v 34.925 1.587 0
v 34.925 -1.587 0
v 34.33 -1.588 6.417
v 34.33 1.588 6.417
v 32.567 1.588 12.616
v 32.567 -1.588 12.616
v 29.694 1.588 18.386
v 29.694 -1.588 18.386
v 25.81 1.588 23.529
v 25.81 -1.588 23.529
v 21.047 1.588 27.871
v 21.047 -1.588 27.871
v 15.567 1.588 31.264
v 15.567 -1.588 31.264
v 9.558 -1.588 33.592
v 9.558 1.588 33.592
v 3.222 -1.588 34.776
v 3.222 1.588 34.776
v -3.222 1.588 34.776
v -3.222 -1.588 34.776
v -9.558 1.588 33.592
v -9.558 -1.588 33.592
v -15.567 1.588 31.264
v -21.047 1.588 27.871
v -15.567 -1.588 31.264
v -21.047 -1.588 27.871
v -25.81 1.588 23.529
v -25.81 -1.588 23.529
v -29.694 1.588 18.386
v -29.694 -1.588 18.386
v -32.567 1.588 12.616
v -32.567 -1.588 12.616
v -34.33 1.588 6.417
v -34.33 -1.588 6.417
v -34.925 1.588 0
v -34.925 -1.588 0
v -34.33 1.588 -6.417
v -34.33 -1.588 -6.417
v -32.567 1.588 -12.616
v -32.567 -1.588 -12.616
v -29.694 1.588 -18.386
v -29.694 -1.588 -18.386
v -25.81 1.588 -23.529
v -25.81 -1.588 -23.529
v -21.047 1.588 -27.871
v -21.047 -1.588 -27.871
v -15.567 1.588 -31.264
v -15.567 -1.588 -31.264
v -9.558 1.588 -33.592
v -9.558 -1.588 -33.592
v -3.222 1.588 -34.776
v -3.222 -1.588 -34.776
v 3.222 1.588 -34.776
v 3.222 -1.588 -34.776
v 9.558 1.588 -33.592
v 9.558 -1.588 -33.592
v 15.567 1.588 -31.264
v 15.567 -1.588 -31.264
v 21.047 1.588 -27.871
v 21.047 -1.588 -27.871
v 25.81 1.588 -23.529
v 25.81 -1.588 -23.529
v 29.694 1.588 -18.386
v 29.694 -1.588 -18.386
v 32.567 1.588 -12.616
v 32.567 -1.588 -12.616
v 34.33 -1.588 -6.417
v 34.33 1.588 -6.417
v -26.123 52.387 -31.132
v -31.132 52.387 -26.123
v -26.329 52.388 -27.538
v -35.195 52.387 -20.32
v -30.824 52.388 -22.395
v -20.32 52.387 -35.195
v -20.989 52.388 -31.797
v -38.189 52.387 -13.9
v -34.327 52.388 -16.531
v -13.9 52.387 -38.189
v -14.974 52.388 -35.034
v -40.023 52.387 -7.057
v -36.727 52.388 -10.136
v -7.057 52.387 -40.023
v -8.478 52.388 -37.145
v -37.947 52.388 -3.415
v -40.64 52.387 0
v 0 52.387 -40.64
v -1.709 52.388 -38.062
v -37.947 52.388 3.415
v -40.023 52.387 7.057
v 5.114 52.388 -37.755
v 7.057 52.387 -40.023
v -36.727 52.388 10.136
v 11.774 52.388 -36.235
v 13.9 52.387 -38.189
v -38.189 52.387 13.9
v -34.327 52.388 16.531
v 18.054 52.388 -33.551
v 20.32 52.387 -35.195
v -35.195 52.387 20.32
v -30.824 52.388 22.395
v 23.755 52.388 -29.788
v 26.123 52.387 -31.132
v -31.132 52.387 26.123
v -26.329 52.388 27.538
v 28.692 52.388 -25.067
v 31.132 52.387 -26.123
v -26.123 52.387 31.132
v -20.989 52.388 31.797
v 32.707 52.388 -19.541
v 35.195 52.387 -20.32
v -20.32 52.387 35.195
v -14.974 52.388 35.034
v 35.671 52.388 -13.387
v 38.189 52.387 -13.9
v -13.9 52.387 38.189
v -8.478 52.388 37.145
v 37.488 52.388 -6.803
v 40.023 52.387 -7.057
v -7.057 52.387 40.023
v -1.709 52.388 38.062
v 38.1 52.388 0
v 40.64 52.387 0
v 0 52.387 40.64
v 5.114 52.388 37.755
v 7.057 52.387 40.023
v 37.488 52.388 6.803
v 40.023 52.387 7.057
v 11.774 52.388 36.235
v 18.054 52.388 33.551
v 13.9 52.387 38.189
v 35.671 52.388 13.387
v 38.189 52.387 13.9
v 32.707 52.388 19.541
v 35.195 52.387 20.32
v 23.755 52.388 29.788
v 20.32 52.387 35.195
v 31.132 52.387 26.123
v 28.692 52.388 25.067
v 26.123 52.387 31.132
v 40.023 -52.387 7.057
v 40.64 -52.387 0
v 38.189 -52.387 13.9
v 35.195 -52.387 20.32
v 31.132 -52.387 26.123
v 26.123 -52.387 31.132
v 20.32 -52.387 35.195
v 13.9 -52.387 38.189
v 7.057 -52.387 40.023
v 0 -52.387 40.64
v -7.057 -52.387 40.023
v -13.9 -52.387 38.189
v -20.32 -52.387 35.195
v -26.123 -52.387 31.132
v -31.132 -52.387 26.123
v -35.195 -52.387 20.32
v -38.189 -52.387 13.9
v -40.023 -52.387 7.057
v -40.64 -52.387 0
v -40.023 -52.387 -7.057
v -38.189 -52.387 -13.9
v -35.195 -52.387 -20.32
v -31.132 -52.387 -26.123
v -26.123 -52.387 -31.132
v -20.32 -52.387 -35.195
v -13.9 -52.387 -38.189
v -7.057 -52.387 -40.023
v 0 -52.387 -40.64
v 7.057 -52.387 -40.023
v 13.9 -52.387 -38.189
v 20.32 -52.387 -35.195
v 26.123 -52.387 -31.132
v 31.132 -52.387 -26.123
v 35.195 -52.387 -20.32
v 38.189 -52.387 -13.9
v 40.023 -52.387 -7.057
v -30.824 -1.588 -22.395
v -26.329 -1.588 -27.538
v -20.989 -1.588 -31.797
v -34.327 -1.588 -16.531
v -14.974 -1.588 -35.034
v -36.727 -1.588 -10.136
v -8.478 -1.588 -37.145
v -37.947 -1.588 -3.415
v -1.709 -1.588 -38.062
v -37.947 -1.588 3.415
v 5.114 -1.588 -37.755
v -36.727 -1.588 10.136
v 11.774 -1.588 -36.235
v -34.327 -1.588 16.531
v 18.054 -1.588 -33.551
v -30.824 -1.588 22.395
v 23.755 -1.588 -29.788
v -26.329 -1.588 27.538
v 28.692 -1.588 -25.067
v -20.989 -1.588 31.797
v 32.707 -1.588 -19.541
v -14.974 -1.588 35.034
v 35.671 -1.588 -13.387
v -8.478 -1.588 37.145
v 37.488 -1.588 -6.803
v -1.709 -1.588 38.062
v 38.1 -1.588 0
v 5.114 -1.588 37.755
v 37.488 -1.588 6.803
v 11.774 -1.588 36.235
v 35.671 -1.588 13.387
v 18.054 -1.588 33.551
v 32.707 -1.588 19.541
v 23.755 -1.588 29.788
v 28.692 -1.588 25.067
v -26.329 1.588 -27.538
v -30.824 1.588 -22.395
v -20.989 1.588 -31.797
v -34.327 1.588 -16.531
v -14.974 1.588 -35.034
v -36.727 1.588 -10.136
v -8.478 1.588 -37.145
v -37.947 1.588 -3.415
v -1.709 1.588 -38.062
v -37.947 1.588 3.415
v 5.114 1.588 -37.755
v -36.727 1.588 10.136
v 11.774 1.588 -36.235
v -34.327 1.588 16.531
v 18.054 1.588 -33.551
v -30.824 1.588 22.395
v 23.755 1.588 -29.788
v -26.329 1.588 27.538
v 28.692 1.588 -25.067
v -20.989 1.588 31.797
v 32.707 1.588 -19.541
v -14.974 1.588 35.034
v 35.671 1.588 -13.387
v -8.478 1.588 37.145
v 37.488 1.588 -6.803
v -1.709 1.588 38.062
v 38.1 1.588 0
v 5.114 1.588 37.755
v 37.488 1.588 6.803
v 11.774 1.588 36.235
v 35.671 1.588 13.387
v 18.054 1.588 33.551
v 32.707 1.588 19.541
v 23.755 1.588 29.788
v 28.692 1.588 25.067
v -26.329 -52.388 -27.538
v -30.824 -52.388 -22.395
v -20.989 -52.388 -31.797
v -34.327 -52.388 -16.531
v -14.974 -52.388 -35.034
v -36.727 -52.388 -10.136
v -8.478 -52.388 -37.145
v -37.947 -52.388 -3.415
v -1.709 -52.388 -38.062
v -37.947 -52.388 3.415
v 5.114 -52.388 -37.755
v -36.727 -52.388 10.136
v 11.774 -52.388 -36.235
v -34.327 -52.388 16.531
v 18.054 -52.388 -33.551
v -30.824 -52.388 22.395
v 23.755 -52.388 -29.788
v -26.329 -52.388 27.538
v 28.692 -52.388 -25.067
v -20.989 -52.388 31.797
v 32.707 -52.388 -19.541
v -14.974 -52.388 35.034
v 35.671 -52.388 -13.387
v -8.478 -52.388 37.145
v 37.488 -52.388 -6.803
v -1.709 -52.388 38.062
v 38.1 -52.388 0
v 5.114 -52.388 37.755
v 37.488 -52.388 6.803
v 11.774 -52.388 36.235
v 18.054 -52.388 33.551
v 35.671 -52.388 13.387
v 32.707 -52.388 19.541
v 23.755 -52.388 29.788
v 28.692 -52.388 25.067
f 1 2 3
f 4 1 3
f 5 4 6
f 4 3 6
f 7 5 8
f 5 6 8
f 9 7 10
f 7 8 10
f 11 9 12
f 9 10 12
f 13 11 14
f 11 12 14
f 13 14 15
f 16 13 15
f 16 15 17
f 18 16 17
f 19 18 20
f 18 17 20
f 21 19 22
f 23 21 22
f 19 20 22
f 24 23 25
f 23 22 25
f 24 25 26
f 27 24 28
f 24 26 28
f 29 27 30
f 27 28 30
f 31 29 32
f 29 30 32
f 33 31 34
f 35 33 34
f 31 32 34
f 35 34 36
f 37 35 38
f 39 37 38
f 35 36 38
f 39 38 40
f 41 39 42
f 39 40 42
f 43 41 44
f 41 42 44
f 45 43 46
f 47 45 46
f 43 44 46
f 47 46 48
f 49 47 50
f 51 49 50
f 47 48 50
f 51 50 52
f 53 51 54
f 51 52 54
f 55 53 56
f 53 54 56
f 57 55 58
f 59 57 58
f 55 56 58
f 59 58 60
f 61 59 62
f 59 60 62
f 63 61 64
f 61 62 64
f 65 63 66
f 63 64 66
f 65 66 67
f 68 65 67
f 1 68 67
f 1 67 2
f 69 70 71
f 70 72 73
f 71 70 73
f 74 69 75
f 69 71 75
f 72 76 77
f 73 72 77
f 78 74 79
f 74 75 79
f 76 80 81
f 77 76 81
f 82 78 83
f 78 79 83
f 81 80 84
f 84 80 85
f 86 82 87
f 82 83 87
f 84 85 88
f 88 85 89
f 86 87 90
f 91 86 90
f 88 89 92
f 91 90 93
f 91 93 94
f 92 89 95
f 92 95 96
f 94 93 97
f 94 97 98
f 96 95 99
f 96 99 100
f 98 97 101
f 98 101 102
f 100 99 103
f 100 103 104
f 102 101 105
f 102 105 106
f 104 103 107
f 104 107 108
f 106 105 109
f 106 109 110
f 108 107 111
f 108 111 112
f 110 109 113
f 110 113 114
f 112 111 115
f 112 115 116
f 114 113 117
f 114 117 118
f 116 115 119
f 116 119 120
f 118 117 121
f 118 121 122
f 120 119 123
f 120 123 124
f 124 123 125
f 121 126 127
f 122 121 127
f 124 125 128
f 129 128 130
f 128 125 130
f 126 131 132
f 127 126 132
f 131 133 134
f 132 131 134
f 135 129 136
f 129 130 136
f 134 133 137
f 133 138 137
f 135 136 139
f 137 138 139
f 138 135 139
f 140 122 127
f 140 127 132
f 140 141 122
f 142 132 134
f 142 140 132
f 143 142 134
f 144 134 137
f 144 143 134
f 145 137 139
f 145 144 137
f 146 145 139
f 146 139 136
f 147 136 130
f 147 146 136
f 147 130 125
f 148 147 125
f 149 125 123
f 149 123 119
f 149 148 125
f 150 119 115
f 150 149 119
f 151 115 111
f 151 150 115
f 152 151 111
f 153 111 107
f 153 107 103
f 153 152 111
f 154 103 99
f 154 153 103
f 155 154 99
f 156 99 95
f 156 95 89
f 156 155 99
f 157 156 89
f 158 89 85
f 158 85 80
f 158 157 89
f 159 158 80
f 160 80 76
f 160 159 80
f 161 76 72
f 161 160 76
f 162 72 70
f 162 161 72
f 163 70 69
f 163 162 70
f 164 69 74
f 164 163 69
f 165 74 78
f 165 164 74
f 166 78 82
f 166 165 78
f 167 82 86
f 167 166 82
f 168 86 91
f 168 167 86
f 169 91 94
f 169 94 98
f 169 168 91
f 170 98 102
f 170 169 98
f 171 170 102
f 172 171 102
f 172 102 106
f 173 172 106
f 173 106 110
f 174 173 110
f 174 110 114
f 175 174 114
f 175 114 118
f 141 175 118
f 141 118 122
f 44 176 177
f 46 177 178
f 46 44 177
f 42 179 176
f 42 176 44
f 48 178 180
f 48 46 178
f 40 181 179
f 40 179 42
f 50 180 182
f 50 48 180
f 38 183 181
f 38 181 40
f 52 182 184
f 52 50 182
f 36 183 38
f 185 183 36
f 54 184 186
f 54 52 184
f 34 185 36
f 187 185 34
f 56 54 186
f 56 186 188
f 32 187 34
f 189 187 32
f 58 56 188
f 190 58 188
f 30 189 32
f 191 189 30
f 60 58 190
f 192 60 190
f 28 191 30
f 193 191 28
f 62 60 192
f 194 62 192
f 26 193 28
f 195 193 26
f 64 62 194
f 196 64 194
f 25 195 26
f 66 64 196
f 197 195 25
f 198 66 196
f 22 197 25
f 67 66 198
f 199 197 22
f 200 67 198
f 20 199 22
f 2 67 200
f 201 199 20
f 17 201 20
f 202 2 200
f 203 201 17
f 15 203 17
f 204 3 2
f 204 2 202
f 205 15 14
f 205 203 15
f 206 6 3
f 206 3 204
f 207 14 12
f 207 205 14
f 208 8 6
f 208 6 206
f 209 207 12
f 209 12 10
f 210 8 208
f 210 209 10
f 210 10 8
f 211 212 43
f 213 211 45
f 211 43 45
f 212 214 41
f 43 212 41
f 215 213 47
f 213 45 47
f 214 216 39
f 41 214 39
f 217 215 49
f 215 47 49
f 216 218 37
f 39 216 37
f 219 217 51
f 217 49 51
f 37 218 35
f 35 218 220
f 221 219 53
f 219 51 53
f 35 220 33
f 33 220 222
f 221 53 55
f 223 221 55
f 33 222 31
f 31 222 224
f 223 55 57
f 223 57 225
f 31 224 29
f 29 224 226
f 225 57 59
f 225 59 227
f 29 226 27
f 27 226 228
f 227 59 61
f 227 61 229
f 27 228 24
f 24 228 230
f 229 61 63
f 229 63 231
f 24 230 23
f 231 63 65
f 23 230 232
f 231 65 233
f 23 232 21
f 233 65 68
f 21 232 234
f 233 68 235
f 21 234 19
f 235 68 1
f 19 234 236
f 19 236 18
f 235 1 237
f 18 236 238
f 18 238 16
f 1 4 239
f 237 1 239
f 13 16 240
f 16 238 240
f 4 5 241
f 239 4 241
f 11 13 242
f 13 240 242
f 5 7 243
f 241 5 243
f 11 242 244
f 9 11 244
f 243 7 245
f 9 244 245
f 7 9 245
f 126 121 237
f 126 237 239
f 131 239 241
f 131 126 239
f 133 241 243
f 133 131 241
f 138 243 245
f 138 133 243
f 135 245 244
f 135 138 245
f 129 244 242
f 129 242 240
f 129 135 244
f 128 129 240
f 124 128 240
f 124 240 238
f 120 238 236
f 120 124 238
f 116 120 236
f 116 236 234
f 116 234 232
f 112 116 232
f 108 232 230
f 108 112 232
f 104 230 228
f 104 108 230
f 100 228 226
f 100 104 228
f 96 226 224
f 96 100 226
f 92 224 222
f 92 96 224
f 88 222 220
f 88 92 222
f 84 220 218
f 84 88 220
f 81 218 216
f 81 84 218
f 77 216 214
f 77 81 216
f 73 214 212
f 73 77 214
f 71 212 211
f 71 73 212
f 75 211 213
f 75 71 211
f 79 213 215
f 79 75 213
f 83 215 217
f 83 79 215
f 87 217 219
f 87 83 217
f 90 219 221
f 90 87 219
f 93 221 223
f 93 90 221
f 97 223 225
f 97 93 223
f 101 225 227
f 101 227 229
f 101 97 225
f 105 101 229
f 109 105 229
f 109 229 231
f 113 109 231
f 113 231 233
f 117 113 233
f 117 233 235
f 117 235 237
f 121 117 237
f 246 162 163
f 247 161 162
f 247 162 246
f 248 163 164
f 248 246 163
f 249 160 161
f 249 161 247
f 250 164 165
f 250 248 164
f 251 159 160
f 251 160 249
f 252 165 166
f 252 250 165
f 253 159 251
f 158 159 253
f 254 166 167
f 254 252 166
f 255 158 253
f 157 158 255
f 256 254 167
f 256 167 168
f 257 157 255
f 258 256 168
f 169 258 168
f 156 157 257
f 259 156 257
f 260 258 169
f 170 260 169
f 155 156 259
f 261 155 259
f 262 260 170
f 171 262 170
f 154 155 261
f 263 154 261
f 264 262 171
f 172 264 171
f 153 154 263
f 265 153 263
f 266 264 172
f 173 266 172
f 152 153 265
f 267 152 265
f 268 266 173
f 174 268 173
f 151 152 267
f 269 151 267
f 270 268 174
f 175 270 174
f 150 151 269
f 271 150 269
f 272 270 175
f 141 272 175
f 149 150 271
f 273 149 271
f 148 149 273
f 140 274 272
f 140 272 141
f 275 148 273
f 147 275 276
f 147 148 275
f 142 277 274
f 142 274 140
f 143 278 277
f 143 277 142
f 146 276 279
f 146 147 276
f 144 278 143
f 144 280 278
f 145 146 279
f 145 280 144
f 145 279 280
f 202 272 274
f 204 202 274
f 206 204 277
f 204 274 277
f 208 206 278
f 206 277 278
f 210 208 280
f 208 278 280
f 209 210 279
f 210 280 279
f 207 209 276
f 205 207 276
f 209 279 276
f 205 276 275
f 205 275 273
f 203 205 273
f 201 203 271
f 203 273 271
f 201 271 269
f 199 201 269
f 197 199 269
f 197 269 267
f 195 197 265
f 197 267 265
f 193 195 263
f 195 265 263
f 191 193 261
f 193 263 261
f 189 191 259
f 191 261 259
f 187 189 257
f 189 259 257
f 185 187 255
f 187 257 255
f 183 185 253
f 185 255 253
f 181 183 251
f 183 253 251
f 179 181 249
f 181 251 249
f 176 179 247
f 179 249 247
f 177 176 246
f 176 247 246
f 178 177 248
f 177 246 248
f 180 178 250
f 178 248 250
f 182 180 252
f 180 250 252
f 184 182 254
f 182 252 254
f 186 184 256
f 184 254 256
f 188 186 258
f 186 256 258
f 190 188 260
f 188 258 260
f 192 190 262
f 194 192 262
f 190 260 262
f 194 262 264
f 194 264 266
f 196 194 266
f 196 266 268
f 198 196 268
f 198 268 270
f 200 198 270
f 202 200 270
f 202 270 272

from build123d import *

# Parameters (mm, degrees)
F0_R          = 40.64
F1_DEPTH      = 1.5875
F2_R          = 34.925
F3_DEPTH      = 1.5885
F3_DEPTH_BACK = 1.5885
F5_R          = 40.64
F6_DEPTH      = 50.8
F7_R          = 38.1
F8_DEPTH      = 50.8


with BuildPart() as f1:
    # F0 (on Front) → F1 (new body, symmetric)
    with BuildSketch(Plane.XZ):
        Circle(F0_R)
    extrude(amount=F1_DEPTH, both=True)

    # F2 (on Front) → F3 (cut, two sides)
    with BuildSketch(Plane.XZ) as f3_sk:
        Circle(F2_R)
    extrude(amount=F3_DEPTH, mode=Mode.SUBTRACT)
    extrude(f3_sk.sketch, amount=-F3_DEPTH_BACK, mode=Mode.SUBTRACT)

    # F5 (on offset) → F6 (join)
    with BuildSketch(Plane.XZ.offset(1.5875)):
        Circle(F5_R)
    extrude(amount=F6_DEPTH)

    # F7 (on face) → F8 (cut)
    with BuildSketch(Plane.XZ.offset(52.3875)):
        Circle(F7_R)
    extrude(amount=-F8_DEPTH, mode=Mode.SUBTRACT)

    # F9: F1 across plane


with BuildPart() as f1_1:
    add(f1.part)
    add(f1.part.mirror(Plane.XZ))


solid = f1_1.part
